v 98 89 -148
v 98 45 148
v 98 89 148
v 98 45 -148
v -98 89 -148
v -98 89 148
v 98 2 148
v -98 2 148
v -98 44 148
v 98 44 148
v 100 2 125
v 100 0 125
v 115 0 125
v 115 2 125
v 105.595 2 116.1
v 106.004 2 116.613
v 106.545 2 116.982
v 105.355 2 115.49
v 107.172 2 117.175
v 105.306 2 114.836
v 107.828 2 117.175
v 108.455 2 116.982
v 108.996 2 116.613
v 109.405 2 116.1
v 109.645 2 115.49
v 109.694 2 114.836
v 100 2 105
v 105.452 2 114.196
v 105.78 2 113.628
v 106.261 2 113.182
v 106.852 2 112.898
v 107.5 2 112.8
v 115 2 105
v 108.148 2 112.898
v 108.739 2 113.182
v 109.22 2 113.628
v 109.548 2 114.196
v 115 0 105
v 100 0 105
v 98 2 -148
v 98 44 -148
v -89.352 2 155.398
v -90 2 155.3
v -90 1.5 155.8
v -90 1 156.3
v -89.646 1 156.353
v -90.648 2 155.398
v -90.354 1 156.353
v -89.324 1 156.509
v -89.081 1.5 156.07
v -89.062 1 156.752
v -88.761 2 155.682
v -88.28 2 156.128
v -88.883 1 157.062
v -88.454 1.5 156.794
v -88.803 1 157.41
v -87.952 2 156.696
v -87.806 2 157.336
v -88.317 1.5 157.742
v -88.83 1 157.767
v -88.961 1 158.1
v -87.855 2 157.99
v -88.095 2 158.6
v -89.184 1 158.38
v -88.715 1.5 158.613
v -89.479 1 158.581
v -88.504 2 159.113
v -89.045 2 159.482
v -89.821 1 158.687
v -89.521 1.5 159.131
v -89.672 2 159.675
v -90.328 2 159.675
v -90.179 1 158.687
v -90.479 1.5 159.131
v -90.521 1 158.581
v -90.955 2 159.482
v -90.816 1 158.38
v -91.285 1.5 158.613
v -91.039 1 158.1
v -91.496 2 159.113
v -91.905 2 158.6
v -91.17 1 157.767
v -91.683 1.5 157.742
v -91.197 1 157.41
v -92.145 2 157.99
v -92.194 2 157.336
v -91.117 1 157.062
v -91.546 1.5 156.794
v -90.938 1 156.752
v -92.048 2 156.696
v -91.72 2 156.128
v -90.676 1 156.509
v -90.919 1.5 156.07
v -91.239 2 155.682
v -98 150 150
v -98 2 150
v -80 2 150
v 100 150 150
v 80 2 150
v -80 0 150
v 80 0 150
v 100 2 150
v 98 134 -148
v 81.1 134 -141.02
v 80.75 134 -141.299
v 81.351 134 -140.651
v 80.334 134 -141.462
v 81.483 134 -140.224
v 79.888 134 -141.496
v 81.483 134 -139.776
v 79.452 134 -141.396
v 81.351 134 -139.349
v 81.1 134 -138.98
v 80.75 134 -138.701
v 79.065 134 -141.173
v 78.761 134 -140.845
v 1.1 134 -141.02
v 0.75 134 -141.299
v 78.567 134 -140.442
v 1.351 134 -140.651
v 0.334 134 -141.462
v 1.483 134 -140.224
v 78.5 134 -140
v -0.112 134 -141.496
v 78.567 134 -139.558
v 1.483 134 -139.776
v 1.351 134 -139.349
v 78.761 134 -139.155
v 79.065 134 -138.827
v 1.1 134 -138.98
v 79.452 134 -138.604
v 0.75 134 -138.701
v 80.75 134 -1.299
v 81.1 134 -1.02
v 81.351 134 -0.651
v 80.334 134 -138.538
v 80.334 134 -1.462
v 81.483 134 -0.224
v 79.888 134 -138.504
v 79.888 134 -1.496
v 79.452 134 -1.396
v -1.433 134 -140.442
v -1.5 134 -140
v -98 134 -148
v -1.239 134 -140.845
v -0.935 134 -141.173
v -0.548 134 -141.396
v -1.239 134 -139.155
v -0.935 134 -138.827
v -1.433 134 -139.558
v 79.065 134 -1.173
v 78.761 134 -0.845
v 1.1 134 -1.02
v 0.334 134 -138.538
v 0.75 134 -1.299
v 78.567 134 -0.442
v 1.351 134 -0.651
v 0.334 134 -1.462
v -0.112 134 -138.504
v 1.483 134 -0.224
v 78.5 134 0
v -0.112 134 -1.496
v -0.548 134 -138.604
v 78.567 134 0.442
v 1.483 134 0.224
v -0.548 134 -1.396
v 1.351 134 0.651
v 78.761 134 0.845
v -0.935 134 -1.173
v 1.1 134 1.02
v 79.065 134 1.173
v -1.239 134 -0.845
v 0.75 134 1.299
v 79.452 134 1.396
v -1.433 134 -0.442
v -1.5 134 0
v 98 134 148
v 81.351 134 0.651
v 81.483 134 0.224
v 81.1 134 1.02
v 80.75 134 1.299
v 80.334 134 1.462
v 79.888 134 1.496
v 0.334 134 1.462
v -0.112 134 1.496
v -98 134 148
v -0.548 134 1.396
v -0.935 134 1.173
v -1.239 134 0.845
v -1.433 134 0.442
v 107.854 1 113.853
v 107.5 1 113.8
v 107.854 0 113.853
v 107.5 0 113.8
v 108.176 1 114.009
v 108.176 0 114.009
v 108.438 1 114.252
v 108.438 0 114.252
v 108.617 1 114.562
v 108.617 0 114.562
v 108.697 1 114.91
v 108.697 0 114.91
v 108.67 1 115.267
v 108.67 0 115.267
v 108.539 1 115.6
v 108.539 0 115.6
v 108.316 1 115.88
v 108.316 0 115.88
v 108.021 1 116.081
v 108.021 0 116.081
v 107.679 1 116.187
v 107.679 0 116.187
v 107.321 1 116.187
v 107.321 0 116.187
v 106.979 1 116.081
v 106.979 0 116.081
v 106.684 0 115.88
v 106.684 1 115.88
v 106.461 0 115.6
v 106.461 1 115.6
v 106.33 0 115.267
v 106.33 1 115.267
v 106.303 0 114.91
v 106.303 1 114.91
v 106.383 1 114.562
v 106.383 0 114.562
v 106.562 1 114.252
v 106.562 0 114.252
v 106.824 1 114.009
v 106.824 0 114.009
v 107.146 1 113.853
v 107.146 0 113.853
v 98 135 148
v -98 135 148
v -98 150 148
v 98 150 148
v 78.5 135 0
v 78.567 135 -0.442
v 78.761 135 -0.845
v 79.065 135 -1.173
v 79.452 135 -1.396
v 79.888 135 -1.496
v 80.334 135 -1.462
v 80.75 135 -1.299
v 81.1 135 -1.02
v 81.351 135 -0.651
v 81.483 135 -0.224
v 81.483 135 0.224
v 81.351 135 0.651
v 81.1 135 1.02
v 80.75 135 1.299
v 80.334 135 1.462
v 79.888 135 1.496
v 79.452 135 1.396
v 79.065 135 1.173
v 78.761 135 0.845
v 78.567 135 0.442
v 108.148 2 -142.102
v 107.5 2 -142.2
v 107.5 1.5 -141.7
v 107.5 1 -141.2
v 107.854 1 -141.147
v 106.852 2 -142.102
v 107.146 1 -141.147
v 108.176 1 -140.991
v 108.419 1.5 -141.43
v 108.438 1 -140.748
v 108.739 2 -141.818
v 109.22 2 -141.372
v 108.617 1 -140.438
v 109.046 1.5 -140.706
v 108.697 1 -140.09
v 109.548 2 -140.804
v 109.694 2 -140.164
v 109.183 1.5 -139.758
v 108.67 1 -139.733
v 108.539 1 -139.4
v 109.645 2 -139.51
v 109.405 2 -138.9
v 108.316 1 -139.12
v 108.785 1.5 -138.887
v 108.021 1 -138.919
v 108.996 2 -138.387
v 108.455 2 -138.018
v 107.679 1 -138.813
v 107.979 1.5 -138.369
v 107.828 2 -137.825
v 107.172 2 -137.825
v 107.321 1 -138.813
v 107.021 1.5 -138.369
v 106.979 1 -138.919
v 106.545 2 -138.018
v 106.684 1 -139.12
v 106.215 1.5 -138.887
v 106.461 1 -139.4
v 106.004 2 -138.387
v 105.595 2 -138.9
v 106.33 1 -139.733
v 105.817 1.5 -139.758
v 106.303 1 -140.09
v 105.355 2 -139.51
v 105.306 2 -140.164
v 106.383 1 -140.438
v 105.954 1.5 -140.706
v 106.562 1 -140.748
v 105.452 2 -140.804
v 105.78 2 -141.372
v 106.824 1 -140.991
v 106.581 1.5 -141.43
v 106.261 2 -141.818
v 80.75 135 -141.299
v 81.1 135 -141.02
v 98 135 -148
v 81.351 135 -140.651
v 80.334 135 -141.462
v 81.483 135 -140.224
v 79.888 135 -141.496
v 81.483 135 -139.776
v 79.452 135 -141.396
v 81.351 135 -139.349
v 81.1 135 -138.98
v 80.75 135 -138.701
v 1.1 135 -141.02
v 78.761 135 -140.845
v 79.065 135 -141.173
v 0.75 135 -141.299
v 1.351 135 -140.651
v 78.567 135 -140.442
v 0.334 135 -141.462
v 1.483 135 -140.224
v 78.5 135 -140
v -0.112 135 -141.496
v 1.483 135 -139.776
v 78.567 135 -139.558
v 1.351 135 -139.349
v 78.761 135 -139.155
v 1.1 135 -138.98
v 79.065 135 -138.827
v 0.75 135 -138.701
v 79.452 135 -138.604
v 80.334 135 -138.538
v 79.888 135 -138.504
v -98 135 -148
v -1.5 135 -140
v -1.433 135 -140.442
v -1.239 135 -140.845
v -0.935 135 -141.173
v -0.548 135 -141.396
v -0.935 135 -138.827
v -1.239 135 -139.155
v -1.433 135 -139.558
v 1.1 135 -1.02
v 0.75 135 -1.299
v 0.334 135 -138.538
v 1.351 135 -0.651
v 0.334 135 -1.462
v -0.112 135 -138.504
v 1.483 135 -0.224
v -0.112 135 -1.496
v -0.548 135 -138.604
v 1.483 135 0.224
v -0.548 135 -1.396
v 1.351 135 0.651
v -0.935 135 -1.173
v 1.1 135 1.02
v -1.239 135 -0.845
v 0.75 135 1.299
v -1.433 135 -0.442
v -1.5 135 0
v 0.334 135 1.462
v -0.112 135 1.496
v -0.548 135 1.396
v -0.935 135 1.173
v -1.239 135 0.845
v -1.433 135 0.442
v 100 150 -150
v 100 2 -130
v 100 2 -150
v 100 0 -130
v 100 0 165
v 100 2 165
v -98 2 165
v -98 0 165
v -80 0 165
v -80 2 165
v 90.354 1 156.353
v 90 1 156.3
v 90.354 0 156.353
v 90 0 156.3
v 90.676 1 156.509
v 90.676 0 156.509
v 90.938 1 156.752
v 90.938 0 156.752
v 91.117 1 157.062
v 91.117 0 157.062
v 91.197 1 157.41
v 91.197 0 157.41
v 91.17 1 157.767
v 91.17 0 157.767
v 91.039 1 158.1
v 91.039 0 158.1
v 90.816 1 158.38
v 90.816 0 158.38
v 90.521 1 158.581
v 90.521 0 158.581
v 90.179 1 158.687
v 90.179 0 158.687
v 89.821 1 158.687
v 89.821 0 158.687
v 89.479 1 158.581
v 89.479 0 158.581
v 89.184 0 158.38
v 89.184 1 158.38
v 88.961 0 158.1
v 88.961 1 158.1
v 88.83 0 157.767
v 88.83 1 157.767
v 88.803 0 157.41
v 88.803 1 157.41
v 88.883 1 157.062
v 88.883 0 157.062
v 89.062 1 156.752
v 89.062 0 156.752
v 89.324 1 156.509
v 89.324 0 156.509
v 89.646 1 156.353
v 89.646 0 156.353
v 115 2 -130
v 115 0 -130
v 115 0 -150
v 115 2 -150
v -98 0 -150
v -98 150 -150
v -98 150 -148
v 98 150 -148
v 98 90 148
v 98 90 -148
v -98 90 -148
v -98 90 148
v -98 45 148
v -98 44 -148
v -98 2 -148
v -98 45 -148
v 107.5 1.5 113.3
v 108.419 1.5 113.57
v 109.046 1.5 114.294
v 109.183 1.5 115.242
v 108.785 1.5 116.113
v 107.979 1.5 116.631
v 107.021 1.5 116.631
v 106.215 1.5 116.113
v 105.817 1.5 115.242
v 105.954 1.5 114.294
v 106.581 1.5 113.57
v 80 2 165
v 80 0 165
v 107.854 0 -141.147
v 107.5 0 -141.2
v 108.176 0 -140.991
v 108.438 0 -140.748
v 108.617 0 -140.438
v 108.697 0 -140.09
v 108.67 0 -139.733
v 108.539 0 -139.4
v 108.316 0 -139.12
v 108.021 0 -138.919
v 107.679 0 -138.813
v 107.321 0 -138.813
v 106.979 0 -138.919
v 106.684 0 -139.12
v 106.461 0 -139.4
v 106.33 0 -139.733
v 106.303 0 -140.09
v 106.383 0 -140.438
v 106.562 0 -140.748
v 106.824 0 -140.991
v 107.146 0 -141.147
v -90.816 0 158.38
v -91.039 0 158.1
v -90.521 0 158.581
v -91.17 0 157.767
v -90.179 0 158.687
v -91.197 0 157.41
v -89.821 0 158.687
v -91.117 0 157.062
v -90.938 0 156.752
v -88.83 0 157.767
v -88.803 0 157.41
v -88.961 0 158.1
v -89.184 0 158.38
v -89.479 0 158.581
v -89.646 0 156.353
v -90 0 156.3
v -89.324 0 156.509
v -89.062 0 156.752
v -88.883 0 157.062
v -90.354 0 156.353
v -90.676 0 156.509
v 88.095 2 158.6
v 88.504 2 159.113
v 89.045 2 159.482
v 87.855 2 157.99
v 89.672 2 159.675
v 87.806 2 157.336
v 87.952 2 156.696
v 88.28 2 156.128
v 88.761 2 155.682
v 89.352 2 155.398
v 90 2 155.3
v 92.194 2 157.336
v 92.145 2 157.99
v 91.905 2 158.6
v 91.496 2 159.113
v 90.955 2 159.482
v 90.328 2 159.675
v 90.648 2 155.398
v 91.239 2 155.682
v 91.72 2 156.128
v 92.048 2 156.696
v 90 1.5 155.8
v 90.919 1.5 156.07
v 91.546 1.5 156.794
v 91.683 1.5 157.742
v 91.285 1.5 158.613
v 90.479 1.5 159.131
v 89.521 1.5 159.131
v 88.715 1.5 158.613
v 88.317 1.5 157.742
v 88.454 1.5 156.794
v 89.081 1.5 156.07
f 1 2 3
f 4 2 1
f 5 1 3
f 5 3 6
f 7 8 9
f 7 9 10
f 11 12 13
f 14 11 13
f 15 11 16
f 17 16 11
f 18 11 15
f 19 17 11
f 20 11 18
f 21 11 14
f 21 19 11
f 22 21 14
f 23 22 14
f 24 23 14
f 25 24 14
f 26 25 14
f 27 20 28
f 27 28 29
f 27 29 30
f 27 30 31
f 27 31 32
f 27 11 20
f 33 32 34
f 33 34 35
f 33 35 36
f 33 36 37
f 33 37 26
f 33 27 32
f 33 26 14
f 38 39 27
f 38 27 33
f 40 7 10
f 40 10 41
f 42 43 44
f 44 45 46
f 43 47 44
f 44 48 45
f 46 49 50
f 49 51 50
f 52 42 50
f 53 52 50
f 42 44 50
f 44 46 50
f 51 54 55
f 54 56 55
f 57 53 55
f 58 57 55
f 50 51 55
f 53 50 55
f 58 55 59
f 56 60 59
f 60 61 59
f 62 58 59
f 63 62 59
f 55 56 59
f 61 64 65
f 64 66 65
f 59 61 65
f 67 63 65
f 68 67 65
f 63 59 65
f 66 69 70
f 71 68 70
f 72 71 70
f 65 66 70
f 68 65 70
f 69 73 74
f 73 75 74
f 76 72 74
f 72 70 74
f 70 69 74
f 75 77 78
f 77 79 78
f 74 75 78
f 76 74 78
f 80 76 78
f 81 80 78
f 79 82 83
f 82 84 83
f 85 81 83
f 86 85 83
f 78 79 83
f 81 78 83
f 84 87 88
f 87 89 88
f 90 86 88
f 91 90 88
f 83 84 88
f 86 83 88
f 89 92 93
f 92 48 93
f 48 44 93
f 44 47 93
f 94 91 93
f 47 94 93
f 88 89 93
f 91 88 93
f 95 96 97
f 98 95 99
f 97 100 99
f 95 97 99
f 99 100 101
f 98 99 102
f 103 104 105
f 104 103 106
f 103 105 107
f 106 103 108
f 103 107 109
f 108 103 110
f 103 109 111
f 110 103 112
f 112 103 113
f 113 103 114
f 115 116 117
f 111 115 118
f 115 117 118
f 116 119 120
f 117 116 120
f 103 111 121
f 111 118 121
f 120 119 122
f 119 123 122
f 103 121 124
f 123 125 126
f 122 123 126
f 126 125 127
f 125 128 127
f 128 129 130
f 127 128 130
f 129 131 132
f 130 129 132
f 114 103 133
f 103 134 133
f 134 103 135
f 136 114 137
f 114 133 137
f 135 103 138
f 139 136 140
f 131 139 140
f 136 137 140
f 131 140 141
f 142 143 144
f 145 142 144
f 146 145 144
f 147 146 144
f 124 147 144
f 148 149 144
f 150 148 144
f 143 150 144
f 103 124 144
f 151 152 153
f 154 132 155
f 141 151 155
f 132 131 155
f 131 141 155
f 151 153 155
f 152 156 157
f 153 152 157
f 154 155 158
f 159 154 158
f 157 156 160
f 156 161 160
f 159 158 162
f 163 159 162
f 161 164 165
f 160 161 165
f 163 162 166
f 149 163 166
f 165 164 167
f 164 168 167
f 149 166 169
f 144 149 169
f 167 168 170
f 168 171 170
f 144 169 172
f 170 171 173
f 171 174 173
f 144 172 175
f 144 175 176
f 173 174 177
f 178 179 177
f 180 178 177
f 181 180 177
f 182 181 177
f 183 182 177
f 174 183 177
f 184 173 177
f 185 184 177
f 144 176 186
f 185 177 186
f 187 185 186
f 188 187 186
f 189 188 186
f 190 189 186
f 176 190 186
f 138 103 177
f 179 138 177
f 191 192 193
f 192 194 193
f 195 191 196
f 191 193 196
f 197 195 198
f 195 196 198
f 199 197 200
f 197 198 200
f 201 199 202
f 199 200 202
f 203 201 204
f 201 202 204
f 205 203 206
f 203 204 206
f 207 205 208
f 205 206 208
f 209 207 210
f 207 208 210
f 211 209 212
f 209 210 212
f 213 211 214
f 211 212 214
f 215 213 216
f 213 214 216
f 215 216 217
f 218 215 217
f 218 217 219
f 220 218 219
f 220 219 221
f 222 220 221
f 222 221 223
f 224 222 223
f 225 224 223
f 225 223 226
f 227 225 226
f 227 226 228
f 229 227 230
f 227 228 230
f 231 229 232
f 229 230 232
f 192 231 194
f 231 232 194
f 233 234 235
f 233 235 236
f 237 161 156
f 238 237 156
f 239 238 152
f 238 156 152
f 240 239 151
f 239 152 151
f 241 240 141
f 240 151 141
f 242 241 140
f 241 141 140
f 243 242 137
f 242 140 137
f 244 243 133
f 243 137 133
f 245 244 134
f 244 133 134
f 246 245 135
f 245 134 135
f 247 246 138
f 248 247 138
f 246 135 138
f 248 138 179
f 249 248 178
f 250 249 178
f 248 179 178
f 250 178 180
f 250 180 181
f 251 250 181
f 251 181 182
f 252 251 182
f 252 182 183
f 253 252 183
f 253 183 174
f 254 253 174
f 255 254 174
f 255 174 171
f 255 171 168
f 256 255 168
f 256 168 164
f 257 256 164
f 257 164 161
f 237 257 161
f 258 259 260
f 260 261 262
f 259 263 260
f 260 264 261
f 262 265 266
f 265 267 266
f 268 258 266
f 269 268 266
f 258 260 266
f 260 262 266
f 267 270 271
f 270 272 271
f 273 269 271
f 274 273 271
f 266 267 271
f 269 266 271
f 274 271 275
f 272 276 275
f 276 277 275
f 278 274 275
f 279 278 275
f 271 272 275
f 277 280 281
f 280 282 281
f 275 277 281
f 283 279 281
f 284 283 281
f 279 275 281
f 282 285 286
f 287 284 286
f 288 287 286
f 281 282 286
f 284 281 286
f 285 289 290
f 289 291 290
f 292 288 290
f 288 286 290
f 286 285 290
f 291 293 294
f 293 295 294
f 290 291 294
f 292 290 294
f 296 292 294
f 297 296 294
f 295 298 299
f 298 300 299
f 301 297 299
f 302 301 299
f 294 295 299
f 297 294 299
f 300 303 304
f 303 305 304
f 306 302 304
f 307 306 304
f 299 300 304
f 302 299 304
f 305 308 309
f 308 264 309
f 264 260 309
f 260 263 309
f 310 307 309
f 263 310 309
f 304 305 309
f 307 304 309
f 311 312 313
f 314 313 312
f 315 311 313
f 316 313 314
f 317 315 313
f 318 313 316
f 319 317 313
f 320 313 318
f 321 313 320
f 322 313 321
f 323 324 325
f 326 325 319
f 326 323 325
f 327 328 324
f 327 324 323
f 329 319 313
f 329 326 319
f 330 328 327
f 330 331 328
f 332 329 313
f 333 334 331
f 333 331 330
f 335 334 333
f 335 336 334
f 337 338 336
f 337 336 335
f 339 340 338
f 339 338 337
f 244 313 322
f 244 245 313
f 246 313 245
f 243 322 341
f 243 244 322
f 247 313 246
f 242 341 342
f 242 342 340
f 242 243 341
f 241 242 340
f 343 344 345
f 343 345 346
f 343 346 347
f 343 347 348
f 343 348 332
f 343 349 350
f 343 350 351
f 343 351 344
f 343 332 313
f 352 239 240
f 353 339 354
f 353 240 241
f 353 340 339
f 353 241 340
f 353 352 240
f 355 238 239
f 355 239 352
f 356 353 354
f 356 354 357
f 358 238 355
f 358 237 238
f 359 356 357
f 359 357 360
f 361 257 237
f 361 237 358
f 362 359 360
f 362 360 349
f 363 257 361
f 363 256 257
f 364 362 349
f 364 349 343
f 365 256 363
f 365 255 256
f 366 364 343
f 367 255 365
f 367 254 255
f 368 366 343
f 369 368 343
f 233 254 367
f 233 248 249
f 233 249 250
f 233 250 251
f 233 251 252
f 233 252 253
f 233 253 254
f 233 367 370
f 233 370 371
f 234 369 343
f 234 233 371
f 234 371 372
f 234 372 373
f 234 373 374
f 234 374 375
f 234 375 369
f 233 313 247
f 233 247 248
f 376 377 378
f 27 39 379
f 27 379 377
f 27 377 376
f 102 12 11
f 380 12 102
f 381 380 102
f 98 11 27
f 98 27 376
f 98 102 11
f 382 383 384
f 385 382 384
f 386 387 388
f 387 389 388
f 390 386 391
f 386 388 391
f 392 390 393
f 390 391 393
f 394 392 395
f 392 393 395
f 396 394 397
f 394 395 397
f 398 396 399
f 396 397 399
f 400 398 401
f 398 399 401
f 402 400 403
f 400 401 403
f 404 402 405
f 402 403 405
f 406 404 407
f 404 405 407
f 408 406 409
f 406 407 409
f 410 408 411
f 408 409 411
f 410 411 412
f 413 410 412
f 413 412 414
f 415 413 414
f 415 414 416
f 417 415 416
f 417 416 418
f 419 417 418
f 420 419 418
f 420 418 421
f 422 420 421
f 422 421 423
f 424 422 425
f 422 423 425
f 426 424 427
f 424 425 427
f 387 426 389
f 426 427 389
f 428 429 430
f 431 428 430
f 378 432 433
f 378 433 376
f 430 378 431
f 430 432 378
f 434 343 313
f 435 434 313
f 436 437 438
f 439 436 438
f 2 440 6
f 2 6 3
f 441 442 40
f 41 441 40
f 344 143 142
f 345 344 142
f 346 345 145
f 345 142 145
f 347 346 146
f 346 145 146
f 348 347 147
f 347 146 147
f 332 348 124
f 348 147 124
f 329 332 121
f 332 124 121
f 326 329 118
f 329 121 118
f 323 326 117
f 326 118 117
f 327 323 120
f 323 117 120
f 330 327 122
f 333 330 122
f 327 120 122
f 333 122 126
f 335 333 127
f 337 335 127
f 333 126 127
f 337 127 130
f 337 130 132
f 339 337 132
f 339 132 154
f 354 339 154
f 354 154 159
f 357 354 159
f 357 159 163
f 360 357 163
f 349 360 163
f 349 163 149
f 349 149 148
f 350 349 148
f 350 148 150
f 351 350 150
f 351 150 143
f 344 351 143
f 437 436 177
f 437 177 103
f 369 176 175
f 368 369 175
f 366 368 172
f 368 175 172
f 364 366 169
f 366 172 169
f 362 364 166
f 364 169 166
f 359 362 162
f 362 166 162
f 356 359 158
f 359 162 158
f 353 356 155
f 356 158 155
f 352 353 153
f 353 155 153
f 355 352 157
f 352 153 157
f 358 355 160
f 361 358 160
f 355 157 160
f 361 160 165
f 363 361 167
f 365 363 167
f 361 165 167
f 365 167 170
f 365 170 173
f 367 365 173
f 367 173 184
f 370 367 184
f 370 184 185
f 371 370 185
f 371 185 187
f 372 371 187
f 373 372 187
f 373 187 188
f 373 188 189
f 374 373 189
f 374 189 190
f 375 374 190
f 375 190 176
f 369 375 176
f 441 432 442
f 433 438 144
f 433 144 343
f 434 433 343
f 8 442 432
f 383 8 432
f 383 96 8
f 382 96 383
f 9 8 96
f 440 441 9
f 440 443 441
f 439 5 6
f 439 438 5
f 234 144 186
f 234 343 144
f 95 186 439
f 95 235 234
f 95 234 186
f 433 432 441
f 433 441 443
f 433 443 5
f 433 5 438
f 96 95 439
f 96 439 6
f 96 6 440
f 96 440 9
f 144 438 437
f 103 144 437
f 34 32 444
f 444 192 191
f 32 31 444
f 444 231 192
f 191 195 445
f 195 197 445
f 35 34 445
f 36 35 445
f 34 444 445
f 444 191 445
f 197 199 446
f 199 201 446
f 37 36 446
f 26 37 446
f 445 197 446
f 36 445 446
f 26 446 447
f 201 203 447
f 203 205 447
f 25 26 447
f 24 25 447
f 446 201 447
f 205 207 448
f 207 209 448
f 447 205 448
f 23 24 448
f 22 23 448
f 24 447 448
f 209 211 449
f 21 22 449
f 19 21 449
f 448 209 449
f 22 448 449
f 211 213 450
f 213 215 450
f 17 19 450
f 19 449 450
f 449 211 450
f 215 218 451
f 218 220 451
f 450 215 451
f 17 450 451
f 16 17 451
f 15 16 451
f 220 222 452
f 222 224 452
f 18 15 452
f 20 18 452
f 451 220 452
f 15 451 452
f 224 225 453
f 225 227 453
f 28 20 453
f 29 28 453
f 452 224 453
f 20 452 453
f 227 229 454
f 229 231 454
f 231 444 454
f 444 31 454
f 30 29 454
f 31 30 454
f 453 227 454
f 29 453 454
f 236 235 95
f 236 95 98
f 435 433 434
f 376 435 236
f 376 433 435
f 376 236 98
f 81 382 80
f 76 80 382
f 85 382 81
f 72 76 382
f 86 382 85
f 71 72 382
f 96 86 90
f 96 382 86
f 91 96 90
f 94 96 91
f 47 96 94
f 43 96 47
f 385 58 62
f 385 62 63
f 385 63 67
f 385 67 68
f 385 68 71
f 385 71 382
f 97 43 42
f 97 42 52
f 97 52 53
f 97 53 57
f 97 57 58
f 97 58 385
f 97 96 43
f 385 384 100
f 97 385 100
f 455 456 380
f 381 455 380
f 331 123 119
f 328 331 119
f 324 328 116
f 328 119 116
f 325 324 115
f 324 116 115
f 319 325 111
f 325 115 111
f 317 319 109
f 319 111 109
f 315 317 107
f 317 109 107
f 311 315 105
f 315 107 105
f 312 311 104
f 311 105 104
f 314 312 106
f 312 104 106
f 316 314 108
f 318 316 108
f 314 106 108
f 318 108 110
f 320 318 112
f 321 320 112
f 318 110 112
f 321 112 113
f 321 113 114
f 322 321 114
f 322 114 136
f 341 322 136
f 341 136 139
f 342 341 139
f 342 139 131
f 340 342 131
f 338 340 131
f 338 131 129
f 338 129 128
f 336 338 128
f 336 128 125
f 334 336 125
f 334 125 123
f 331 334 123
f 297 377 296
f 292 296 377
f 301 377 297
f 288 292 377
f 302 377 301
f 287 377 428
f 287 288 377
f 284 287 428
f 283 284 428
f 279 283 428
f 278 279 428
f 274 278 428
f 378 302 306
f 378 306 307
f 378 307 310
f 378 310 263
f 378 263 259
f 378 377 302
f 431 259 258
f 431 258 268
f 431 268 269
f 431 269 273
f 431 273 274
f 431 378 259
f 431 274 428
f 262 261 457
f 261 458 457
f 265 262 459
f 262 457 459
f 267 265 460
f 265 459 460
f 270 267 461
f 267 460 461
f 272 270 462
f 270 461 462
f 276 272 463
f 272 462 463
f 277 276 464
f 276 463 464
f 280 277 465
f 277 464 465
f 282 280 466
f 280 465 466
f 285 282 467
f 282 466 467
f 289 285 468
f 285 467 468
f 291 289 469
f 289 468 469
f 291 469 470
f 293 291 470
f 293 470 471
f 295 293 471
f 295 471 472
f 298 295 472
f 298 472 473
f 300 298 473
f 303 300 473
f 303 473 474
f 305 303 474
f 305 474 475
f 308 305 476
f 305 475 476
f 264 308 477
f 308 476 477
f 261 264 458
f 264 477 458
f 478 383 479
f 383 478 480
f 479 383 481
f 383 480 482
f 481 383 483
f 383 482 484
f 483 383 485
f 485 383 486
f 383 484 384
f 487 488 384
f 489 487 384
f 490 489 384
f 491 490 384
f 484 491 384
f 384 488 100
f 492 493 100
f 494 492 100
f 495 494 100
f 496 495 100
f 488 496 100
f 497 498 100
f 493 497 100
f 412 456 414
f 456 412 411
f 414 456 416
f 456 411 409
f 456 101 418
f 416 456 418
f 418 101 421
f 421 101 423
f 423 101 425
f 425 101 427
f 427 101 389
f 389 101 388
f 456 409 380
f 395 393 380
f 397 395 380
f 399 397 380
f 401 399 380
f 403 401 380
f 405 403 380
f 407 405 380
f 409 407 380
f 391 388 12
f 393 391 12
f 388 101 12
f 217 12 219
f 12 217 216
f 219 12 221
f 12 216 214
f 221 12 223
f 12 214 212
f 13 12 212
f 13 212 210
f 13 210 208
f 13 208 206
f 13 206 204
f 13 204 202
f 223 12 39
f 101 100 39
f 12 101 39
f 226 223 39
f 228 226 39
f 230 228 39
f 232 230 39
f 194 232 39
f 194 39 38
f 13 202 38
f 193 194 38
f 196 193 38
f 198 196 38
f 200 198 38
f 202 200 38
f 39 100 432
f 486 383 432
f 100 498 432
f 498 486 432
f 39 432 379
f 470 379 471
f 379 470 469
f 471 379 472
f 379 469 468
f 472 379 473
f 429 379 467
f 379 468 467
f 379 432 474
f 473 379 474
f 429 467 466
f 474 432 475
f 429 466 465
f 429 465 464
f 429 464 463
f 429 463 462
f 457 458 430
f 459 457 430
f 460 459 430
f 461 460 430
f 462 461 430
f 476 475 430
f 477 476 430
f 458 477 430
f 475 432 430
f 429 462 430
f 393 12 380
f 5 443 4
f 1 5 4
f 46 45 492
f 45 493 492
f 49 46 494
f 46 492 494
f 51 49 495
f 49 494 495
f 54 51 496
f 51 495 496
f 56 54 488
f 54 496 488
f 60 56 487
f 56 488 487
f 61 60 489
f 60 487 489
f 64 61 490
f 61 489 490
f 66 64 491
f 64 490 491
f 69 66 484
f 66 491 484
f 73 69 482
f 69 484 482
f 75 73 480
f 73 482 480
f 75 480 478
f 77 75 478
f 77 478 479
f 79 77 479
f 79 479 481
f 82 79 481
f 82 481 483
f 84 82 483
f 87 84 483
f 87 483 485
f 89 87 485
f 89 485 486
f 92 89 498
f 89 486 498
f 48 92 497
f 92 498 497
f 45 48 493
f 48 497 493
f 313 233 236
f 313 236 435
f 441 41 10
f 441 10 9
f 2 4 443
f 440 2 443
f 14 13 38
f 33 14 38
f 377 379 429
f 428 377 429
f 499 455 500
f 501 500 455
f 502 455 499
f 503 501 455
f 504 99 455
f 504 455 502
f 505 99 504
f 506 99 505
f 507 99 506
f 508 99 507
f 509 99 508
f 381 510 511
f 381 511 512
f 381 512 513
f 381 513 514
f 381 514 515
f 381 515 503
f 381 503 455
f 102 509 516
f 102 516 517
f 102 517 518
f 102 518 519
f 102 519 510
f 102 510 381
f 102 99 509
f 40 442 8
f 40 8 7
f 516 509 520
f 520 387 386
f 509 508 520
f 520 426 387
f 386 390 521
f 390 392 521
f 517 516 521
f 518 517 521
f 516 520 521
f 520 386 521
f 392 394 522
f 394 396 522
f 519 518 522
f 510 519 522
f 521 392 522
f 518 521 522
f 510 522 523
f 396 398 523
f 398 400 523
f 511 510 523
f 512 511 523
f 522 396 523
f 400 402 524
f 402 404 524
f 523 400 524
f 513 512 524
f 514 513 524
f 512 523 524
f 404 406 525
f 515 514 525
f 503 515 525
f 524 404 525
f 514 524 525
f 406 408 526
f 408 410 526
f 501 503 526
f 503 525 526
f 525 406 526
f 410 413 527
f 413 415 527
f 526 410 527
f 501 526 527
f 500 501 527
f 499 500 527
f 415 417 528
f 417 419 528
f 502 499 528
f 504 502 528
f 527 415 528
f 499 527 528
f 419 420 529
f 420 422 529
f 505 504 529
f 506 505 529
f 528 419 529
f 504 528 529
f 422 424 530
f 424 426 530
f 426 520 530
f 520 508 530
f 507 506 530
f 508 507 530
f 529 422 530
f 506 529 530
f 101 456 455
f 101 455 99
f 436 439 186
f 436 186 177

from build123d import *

# Parameters (mm, degrees)
SKETCH2_W                                           = 200
SKETCH2_H                                           = 300
BOSS_EXTRUDE1_DEPTH                                 = 150
SHELL1_T                                            = -2
SKETCH4_W                                           = 20
SKETCH4_H                                           = 15
SKETCH4_W_2                                         = 15
SKETCH4_H_2                                         = 20
BOSS_EXTRUDE2_DEPTH                                 = 2
CSK_FOR_M2_COUNTERSUNK_FLAT_HEAD_SCREW1_D           = 2.4
CSK_FOR_M2_COUNTERSUNK_FLAT_HEAD_SCREW1_DEPTH       = 30
CSK_FOR_M2_COUNTERSUNK_FLAT_HEAD_SCREW1_CSINK_D     = 4.4
CSK_FOR_M2_COUNTERSUNK_FLAT_HEAD_SCREW1_CSINK_ANGLE = 90
CSK_FOR_M2_COUNTERSUNK_FLAT_HEAD_SCREW1_TIP         = 0.721032743
SKETCH6_W                                           = 200
SKETCH6_H                                           = 1
EXTRUDE_THIN1_DEPTH                                 = 296
CUT_EXTRUDE1_DEPTH                                  = 2
F_3_0MM_DOWEL_HOLE1_D                               = 3
F_3_0MM_DOWEL_HOLE1_DEPTH                           = 30
F_3_0MM_DOWEL_HOLE1_TIP                             = 0.901290929


with BuildPart() as part:
    # Sketch2 → Boss-Extrude1 (new body)
    with BuildSketch(Plane(origin=(0, 0, 0), x_dir=(1, 0, 0), z_dir=(0, 1, 0))):
        Rectangle(SKETCH2_W, SKETCH2_H)
    extrude(amount=BOSS_EXTRUDE1_DEPTH)

    # Shell1
    shell1_openings = [part.faces().sort_by_distance(p)[0] for p in [
        (0, 150, 0),
    ]]
    offset(amount=SHELL1_T, openings=shell1_openings, kind=Kind.INTERSECTION)

    # Sketch4 → Boss-Extrude2 (add)
    with BuildSketch(Plane(origin=(0, 0, 0), x_dir=(1, 0, 0), z_dir=(0, 1, 0))):
        with Locations((-90, -157.5)):
            Rectangle(SKETCH4_W, SKETCH4_H)
        with Locations((90, -157.5)):
            Rectangle(SKETCH4_W, SKETCH4_H)
        with Locations((107.5, 140)):
            Rectangle(SKETCH4_W_2, SKETCH4_H_2)
        with Locations((107.5, -115)):
            Rectangle(SKETCH4_W_2, SKETCH4_H_2)
    extrude(amount=BOSS_EXTRUDE2_DEPTH)

    # CSK for M2 Countersunk Flat Head Screw1
    with Locations(Plane(origin=(107.5, 2, -140), x_dir=(0, 0, 1), z_dir=(0, 1, 0))):
        with Locations((0, 0), (255, 0), (297.5, -17.5), (297.5, -197.5)):
            CounterSinkHole(CSK_FOR_M2_COUNTERSUNK_FLAT_HEAD_SCREW1_D / 2, CSK_FOR_M2_COUNTERSUNK_FLAT_HEAD_SCREW1_CSINK_D / 2, depth=CSK_FOR_M2_COUNTERSUNK_FLAT_HEAD_SCREW1_DEPTH, counter_sink_angle=CSK_FOR_M2_COUNTERSUNK_FLAT_HEAD_SCREW1_CSINK_ANGLE)
            with Locations((0, 0, -(CSK_FOR_M2_COUNTERSUNK_FLAT_HEAD_SCREW1_DEPTH + CSK_FOR_M2_COUNTERSUNK_FLAT_HEAD_SCREW1_TIP / 2))):  # 118° drill point
                Cone(0, CSK_FOR_M2_COUNTERSUNK_FLAT_HEAD_SCREW1_D / 2, CSK_FOR_M2_COUNTERSUNK_FLAT_HEAD_SCREW1_TIP, mode=Mode.SUBTRACT)

    # Sketch6 → Extrude-Thin1 (add)
    with BuildSketch(Plane(origin=(0, 0, 148), x_dir=(-1, 0, 0), z_dir=(0, 0, -1))):
        with Locations((0, 44.5)):
            Rectangle(SKETCH6_W, SKETCH6_H)
        with Locations((0, 89.5)):
            Rectangle(SKETCH6_W, SKETCH6_H)
        with Locations((0, 134.5)):
            Rectangle(SKETCH6_W, SKETCH6_H)
    extrude(amount=EXTRUDE_THIN1_DEPTH)

    # Sketch7 → Cut-Extrude1 (cut)
    with BuildSketch(Plane.ZY.offset(100)):
        Polygon((-150, 0), (165, 0), (165, 2), (150, 2), (150, 150), (-150, 150), align=None)
    extrude(amount=-CUT_EXTRUDE1_DEPTH, mode=Mode.SUBTRACT)

    # Ø3.0mm Dowel Hole1
    with Locations(Plane(origin=(0, 135, 0), x_dir=(1, 0, 0), z_dir=(0, 1, 0))):
        with Locations((0, 0), (80, 140), (0, 140), (80, 0)):
            Hole(F_3_0MM_DOWEL_HOLE1_D / 2, depth=F_3_0MM_DOWEL_HOLE1_DEPTH)
            with Locations((0, 0, -(F_3_0MM_DOWEL_HOLE1_DEPTH + F_3_0MM_DOWEL_HOLE1_TIP / 2))):  # 118° drill point
                Cone(0, F_3_0MM_DOWEL_HOLE1_D / 2, F_3_0MM_DOWEL_HOLE1_TIP, mode=Mode.SUBTRACT)


solid = part.part
